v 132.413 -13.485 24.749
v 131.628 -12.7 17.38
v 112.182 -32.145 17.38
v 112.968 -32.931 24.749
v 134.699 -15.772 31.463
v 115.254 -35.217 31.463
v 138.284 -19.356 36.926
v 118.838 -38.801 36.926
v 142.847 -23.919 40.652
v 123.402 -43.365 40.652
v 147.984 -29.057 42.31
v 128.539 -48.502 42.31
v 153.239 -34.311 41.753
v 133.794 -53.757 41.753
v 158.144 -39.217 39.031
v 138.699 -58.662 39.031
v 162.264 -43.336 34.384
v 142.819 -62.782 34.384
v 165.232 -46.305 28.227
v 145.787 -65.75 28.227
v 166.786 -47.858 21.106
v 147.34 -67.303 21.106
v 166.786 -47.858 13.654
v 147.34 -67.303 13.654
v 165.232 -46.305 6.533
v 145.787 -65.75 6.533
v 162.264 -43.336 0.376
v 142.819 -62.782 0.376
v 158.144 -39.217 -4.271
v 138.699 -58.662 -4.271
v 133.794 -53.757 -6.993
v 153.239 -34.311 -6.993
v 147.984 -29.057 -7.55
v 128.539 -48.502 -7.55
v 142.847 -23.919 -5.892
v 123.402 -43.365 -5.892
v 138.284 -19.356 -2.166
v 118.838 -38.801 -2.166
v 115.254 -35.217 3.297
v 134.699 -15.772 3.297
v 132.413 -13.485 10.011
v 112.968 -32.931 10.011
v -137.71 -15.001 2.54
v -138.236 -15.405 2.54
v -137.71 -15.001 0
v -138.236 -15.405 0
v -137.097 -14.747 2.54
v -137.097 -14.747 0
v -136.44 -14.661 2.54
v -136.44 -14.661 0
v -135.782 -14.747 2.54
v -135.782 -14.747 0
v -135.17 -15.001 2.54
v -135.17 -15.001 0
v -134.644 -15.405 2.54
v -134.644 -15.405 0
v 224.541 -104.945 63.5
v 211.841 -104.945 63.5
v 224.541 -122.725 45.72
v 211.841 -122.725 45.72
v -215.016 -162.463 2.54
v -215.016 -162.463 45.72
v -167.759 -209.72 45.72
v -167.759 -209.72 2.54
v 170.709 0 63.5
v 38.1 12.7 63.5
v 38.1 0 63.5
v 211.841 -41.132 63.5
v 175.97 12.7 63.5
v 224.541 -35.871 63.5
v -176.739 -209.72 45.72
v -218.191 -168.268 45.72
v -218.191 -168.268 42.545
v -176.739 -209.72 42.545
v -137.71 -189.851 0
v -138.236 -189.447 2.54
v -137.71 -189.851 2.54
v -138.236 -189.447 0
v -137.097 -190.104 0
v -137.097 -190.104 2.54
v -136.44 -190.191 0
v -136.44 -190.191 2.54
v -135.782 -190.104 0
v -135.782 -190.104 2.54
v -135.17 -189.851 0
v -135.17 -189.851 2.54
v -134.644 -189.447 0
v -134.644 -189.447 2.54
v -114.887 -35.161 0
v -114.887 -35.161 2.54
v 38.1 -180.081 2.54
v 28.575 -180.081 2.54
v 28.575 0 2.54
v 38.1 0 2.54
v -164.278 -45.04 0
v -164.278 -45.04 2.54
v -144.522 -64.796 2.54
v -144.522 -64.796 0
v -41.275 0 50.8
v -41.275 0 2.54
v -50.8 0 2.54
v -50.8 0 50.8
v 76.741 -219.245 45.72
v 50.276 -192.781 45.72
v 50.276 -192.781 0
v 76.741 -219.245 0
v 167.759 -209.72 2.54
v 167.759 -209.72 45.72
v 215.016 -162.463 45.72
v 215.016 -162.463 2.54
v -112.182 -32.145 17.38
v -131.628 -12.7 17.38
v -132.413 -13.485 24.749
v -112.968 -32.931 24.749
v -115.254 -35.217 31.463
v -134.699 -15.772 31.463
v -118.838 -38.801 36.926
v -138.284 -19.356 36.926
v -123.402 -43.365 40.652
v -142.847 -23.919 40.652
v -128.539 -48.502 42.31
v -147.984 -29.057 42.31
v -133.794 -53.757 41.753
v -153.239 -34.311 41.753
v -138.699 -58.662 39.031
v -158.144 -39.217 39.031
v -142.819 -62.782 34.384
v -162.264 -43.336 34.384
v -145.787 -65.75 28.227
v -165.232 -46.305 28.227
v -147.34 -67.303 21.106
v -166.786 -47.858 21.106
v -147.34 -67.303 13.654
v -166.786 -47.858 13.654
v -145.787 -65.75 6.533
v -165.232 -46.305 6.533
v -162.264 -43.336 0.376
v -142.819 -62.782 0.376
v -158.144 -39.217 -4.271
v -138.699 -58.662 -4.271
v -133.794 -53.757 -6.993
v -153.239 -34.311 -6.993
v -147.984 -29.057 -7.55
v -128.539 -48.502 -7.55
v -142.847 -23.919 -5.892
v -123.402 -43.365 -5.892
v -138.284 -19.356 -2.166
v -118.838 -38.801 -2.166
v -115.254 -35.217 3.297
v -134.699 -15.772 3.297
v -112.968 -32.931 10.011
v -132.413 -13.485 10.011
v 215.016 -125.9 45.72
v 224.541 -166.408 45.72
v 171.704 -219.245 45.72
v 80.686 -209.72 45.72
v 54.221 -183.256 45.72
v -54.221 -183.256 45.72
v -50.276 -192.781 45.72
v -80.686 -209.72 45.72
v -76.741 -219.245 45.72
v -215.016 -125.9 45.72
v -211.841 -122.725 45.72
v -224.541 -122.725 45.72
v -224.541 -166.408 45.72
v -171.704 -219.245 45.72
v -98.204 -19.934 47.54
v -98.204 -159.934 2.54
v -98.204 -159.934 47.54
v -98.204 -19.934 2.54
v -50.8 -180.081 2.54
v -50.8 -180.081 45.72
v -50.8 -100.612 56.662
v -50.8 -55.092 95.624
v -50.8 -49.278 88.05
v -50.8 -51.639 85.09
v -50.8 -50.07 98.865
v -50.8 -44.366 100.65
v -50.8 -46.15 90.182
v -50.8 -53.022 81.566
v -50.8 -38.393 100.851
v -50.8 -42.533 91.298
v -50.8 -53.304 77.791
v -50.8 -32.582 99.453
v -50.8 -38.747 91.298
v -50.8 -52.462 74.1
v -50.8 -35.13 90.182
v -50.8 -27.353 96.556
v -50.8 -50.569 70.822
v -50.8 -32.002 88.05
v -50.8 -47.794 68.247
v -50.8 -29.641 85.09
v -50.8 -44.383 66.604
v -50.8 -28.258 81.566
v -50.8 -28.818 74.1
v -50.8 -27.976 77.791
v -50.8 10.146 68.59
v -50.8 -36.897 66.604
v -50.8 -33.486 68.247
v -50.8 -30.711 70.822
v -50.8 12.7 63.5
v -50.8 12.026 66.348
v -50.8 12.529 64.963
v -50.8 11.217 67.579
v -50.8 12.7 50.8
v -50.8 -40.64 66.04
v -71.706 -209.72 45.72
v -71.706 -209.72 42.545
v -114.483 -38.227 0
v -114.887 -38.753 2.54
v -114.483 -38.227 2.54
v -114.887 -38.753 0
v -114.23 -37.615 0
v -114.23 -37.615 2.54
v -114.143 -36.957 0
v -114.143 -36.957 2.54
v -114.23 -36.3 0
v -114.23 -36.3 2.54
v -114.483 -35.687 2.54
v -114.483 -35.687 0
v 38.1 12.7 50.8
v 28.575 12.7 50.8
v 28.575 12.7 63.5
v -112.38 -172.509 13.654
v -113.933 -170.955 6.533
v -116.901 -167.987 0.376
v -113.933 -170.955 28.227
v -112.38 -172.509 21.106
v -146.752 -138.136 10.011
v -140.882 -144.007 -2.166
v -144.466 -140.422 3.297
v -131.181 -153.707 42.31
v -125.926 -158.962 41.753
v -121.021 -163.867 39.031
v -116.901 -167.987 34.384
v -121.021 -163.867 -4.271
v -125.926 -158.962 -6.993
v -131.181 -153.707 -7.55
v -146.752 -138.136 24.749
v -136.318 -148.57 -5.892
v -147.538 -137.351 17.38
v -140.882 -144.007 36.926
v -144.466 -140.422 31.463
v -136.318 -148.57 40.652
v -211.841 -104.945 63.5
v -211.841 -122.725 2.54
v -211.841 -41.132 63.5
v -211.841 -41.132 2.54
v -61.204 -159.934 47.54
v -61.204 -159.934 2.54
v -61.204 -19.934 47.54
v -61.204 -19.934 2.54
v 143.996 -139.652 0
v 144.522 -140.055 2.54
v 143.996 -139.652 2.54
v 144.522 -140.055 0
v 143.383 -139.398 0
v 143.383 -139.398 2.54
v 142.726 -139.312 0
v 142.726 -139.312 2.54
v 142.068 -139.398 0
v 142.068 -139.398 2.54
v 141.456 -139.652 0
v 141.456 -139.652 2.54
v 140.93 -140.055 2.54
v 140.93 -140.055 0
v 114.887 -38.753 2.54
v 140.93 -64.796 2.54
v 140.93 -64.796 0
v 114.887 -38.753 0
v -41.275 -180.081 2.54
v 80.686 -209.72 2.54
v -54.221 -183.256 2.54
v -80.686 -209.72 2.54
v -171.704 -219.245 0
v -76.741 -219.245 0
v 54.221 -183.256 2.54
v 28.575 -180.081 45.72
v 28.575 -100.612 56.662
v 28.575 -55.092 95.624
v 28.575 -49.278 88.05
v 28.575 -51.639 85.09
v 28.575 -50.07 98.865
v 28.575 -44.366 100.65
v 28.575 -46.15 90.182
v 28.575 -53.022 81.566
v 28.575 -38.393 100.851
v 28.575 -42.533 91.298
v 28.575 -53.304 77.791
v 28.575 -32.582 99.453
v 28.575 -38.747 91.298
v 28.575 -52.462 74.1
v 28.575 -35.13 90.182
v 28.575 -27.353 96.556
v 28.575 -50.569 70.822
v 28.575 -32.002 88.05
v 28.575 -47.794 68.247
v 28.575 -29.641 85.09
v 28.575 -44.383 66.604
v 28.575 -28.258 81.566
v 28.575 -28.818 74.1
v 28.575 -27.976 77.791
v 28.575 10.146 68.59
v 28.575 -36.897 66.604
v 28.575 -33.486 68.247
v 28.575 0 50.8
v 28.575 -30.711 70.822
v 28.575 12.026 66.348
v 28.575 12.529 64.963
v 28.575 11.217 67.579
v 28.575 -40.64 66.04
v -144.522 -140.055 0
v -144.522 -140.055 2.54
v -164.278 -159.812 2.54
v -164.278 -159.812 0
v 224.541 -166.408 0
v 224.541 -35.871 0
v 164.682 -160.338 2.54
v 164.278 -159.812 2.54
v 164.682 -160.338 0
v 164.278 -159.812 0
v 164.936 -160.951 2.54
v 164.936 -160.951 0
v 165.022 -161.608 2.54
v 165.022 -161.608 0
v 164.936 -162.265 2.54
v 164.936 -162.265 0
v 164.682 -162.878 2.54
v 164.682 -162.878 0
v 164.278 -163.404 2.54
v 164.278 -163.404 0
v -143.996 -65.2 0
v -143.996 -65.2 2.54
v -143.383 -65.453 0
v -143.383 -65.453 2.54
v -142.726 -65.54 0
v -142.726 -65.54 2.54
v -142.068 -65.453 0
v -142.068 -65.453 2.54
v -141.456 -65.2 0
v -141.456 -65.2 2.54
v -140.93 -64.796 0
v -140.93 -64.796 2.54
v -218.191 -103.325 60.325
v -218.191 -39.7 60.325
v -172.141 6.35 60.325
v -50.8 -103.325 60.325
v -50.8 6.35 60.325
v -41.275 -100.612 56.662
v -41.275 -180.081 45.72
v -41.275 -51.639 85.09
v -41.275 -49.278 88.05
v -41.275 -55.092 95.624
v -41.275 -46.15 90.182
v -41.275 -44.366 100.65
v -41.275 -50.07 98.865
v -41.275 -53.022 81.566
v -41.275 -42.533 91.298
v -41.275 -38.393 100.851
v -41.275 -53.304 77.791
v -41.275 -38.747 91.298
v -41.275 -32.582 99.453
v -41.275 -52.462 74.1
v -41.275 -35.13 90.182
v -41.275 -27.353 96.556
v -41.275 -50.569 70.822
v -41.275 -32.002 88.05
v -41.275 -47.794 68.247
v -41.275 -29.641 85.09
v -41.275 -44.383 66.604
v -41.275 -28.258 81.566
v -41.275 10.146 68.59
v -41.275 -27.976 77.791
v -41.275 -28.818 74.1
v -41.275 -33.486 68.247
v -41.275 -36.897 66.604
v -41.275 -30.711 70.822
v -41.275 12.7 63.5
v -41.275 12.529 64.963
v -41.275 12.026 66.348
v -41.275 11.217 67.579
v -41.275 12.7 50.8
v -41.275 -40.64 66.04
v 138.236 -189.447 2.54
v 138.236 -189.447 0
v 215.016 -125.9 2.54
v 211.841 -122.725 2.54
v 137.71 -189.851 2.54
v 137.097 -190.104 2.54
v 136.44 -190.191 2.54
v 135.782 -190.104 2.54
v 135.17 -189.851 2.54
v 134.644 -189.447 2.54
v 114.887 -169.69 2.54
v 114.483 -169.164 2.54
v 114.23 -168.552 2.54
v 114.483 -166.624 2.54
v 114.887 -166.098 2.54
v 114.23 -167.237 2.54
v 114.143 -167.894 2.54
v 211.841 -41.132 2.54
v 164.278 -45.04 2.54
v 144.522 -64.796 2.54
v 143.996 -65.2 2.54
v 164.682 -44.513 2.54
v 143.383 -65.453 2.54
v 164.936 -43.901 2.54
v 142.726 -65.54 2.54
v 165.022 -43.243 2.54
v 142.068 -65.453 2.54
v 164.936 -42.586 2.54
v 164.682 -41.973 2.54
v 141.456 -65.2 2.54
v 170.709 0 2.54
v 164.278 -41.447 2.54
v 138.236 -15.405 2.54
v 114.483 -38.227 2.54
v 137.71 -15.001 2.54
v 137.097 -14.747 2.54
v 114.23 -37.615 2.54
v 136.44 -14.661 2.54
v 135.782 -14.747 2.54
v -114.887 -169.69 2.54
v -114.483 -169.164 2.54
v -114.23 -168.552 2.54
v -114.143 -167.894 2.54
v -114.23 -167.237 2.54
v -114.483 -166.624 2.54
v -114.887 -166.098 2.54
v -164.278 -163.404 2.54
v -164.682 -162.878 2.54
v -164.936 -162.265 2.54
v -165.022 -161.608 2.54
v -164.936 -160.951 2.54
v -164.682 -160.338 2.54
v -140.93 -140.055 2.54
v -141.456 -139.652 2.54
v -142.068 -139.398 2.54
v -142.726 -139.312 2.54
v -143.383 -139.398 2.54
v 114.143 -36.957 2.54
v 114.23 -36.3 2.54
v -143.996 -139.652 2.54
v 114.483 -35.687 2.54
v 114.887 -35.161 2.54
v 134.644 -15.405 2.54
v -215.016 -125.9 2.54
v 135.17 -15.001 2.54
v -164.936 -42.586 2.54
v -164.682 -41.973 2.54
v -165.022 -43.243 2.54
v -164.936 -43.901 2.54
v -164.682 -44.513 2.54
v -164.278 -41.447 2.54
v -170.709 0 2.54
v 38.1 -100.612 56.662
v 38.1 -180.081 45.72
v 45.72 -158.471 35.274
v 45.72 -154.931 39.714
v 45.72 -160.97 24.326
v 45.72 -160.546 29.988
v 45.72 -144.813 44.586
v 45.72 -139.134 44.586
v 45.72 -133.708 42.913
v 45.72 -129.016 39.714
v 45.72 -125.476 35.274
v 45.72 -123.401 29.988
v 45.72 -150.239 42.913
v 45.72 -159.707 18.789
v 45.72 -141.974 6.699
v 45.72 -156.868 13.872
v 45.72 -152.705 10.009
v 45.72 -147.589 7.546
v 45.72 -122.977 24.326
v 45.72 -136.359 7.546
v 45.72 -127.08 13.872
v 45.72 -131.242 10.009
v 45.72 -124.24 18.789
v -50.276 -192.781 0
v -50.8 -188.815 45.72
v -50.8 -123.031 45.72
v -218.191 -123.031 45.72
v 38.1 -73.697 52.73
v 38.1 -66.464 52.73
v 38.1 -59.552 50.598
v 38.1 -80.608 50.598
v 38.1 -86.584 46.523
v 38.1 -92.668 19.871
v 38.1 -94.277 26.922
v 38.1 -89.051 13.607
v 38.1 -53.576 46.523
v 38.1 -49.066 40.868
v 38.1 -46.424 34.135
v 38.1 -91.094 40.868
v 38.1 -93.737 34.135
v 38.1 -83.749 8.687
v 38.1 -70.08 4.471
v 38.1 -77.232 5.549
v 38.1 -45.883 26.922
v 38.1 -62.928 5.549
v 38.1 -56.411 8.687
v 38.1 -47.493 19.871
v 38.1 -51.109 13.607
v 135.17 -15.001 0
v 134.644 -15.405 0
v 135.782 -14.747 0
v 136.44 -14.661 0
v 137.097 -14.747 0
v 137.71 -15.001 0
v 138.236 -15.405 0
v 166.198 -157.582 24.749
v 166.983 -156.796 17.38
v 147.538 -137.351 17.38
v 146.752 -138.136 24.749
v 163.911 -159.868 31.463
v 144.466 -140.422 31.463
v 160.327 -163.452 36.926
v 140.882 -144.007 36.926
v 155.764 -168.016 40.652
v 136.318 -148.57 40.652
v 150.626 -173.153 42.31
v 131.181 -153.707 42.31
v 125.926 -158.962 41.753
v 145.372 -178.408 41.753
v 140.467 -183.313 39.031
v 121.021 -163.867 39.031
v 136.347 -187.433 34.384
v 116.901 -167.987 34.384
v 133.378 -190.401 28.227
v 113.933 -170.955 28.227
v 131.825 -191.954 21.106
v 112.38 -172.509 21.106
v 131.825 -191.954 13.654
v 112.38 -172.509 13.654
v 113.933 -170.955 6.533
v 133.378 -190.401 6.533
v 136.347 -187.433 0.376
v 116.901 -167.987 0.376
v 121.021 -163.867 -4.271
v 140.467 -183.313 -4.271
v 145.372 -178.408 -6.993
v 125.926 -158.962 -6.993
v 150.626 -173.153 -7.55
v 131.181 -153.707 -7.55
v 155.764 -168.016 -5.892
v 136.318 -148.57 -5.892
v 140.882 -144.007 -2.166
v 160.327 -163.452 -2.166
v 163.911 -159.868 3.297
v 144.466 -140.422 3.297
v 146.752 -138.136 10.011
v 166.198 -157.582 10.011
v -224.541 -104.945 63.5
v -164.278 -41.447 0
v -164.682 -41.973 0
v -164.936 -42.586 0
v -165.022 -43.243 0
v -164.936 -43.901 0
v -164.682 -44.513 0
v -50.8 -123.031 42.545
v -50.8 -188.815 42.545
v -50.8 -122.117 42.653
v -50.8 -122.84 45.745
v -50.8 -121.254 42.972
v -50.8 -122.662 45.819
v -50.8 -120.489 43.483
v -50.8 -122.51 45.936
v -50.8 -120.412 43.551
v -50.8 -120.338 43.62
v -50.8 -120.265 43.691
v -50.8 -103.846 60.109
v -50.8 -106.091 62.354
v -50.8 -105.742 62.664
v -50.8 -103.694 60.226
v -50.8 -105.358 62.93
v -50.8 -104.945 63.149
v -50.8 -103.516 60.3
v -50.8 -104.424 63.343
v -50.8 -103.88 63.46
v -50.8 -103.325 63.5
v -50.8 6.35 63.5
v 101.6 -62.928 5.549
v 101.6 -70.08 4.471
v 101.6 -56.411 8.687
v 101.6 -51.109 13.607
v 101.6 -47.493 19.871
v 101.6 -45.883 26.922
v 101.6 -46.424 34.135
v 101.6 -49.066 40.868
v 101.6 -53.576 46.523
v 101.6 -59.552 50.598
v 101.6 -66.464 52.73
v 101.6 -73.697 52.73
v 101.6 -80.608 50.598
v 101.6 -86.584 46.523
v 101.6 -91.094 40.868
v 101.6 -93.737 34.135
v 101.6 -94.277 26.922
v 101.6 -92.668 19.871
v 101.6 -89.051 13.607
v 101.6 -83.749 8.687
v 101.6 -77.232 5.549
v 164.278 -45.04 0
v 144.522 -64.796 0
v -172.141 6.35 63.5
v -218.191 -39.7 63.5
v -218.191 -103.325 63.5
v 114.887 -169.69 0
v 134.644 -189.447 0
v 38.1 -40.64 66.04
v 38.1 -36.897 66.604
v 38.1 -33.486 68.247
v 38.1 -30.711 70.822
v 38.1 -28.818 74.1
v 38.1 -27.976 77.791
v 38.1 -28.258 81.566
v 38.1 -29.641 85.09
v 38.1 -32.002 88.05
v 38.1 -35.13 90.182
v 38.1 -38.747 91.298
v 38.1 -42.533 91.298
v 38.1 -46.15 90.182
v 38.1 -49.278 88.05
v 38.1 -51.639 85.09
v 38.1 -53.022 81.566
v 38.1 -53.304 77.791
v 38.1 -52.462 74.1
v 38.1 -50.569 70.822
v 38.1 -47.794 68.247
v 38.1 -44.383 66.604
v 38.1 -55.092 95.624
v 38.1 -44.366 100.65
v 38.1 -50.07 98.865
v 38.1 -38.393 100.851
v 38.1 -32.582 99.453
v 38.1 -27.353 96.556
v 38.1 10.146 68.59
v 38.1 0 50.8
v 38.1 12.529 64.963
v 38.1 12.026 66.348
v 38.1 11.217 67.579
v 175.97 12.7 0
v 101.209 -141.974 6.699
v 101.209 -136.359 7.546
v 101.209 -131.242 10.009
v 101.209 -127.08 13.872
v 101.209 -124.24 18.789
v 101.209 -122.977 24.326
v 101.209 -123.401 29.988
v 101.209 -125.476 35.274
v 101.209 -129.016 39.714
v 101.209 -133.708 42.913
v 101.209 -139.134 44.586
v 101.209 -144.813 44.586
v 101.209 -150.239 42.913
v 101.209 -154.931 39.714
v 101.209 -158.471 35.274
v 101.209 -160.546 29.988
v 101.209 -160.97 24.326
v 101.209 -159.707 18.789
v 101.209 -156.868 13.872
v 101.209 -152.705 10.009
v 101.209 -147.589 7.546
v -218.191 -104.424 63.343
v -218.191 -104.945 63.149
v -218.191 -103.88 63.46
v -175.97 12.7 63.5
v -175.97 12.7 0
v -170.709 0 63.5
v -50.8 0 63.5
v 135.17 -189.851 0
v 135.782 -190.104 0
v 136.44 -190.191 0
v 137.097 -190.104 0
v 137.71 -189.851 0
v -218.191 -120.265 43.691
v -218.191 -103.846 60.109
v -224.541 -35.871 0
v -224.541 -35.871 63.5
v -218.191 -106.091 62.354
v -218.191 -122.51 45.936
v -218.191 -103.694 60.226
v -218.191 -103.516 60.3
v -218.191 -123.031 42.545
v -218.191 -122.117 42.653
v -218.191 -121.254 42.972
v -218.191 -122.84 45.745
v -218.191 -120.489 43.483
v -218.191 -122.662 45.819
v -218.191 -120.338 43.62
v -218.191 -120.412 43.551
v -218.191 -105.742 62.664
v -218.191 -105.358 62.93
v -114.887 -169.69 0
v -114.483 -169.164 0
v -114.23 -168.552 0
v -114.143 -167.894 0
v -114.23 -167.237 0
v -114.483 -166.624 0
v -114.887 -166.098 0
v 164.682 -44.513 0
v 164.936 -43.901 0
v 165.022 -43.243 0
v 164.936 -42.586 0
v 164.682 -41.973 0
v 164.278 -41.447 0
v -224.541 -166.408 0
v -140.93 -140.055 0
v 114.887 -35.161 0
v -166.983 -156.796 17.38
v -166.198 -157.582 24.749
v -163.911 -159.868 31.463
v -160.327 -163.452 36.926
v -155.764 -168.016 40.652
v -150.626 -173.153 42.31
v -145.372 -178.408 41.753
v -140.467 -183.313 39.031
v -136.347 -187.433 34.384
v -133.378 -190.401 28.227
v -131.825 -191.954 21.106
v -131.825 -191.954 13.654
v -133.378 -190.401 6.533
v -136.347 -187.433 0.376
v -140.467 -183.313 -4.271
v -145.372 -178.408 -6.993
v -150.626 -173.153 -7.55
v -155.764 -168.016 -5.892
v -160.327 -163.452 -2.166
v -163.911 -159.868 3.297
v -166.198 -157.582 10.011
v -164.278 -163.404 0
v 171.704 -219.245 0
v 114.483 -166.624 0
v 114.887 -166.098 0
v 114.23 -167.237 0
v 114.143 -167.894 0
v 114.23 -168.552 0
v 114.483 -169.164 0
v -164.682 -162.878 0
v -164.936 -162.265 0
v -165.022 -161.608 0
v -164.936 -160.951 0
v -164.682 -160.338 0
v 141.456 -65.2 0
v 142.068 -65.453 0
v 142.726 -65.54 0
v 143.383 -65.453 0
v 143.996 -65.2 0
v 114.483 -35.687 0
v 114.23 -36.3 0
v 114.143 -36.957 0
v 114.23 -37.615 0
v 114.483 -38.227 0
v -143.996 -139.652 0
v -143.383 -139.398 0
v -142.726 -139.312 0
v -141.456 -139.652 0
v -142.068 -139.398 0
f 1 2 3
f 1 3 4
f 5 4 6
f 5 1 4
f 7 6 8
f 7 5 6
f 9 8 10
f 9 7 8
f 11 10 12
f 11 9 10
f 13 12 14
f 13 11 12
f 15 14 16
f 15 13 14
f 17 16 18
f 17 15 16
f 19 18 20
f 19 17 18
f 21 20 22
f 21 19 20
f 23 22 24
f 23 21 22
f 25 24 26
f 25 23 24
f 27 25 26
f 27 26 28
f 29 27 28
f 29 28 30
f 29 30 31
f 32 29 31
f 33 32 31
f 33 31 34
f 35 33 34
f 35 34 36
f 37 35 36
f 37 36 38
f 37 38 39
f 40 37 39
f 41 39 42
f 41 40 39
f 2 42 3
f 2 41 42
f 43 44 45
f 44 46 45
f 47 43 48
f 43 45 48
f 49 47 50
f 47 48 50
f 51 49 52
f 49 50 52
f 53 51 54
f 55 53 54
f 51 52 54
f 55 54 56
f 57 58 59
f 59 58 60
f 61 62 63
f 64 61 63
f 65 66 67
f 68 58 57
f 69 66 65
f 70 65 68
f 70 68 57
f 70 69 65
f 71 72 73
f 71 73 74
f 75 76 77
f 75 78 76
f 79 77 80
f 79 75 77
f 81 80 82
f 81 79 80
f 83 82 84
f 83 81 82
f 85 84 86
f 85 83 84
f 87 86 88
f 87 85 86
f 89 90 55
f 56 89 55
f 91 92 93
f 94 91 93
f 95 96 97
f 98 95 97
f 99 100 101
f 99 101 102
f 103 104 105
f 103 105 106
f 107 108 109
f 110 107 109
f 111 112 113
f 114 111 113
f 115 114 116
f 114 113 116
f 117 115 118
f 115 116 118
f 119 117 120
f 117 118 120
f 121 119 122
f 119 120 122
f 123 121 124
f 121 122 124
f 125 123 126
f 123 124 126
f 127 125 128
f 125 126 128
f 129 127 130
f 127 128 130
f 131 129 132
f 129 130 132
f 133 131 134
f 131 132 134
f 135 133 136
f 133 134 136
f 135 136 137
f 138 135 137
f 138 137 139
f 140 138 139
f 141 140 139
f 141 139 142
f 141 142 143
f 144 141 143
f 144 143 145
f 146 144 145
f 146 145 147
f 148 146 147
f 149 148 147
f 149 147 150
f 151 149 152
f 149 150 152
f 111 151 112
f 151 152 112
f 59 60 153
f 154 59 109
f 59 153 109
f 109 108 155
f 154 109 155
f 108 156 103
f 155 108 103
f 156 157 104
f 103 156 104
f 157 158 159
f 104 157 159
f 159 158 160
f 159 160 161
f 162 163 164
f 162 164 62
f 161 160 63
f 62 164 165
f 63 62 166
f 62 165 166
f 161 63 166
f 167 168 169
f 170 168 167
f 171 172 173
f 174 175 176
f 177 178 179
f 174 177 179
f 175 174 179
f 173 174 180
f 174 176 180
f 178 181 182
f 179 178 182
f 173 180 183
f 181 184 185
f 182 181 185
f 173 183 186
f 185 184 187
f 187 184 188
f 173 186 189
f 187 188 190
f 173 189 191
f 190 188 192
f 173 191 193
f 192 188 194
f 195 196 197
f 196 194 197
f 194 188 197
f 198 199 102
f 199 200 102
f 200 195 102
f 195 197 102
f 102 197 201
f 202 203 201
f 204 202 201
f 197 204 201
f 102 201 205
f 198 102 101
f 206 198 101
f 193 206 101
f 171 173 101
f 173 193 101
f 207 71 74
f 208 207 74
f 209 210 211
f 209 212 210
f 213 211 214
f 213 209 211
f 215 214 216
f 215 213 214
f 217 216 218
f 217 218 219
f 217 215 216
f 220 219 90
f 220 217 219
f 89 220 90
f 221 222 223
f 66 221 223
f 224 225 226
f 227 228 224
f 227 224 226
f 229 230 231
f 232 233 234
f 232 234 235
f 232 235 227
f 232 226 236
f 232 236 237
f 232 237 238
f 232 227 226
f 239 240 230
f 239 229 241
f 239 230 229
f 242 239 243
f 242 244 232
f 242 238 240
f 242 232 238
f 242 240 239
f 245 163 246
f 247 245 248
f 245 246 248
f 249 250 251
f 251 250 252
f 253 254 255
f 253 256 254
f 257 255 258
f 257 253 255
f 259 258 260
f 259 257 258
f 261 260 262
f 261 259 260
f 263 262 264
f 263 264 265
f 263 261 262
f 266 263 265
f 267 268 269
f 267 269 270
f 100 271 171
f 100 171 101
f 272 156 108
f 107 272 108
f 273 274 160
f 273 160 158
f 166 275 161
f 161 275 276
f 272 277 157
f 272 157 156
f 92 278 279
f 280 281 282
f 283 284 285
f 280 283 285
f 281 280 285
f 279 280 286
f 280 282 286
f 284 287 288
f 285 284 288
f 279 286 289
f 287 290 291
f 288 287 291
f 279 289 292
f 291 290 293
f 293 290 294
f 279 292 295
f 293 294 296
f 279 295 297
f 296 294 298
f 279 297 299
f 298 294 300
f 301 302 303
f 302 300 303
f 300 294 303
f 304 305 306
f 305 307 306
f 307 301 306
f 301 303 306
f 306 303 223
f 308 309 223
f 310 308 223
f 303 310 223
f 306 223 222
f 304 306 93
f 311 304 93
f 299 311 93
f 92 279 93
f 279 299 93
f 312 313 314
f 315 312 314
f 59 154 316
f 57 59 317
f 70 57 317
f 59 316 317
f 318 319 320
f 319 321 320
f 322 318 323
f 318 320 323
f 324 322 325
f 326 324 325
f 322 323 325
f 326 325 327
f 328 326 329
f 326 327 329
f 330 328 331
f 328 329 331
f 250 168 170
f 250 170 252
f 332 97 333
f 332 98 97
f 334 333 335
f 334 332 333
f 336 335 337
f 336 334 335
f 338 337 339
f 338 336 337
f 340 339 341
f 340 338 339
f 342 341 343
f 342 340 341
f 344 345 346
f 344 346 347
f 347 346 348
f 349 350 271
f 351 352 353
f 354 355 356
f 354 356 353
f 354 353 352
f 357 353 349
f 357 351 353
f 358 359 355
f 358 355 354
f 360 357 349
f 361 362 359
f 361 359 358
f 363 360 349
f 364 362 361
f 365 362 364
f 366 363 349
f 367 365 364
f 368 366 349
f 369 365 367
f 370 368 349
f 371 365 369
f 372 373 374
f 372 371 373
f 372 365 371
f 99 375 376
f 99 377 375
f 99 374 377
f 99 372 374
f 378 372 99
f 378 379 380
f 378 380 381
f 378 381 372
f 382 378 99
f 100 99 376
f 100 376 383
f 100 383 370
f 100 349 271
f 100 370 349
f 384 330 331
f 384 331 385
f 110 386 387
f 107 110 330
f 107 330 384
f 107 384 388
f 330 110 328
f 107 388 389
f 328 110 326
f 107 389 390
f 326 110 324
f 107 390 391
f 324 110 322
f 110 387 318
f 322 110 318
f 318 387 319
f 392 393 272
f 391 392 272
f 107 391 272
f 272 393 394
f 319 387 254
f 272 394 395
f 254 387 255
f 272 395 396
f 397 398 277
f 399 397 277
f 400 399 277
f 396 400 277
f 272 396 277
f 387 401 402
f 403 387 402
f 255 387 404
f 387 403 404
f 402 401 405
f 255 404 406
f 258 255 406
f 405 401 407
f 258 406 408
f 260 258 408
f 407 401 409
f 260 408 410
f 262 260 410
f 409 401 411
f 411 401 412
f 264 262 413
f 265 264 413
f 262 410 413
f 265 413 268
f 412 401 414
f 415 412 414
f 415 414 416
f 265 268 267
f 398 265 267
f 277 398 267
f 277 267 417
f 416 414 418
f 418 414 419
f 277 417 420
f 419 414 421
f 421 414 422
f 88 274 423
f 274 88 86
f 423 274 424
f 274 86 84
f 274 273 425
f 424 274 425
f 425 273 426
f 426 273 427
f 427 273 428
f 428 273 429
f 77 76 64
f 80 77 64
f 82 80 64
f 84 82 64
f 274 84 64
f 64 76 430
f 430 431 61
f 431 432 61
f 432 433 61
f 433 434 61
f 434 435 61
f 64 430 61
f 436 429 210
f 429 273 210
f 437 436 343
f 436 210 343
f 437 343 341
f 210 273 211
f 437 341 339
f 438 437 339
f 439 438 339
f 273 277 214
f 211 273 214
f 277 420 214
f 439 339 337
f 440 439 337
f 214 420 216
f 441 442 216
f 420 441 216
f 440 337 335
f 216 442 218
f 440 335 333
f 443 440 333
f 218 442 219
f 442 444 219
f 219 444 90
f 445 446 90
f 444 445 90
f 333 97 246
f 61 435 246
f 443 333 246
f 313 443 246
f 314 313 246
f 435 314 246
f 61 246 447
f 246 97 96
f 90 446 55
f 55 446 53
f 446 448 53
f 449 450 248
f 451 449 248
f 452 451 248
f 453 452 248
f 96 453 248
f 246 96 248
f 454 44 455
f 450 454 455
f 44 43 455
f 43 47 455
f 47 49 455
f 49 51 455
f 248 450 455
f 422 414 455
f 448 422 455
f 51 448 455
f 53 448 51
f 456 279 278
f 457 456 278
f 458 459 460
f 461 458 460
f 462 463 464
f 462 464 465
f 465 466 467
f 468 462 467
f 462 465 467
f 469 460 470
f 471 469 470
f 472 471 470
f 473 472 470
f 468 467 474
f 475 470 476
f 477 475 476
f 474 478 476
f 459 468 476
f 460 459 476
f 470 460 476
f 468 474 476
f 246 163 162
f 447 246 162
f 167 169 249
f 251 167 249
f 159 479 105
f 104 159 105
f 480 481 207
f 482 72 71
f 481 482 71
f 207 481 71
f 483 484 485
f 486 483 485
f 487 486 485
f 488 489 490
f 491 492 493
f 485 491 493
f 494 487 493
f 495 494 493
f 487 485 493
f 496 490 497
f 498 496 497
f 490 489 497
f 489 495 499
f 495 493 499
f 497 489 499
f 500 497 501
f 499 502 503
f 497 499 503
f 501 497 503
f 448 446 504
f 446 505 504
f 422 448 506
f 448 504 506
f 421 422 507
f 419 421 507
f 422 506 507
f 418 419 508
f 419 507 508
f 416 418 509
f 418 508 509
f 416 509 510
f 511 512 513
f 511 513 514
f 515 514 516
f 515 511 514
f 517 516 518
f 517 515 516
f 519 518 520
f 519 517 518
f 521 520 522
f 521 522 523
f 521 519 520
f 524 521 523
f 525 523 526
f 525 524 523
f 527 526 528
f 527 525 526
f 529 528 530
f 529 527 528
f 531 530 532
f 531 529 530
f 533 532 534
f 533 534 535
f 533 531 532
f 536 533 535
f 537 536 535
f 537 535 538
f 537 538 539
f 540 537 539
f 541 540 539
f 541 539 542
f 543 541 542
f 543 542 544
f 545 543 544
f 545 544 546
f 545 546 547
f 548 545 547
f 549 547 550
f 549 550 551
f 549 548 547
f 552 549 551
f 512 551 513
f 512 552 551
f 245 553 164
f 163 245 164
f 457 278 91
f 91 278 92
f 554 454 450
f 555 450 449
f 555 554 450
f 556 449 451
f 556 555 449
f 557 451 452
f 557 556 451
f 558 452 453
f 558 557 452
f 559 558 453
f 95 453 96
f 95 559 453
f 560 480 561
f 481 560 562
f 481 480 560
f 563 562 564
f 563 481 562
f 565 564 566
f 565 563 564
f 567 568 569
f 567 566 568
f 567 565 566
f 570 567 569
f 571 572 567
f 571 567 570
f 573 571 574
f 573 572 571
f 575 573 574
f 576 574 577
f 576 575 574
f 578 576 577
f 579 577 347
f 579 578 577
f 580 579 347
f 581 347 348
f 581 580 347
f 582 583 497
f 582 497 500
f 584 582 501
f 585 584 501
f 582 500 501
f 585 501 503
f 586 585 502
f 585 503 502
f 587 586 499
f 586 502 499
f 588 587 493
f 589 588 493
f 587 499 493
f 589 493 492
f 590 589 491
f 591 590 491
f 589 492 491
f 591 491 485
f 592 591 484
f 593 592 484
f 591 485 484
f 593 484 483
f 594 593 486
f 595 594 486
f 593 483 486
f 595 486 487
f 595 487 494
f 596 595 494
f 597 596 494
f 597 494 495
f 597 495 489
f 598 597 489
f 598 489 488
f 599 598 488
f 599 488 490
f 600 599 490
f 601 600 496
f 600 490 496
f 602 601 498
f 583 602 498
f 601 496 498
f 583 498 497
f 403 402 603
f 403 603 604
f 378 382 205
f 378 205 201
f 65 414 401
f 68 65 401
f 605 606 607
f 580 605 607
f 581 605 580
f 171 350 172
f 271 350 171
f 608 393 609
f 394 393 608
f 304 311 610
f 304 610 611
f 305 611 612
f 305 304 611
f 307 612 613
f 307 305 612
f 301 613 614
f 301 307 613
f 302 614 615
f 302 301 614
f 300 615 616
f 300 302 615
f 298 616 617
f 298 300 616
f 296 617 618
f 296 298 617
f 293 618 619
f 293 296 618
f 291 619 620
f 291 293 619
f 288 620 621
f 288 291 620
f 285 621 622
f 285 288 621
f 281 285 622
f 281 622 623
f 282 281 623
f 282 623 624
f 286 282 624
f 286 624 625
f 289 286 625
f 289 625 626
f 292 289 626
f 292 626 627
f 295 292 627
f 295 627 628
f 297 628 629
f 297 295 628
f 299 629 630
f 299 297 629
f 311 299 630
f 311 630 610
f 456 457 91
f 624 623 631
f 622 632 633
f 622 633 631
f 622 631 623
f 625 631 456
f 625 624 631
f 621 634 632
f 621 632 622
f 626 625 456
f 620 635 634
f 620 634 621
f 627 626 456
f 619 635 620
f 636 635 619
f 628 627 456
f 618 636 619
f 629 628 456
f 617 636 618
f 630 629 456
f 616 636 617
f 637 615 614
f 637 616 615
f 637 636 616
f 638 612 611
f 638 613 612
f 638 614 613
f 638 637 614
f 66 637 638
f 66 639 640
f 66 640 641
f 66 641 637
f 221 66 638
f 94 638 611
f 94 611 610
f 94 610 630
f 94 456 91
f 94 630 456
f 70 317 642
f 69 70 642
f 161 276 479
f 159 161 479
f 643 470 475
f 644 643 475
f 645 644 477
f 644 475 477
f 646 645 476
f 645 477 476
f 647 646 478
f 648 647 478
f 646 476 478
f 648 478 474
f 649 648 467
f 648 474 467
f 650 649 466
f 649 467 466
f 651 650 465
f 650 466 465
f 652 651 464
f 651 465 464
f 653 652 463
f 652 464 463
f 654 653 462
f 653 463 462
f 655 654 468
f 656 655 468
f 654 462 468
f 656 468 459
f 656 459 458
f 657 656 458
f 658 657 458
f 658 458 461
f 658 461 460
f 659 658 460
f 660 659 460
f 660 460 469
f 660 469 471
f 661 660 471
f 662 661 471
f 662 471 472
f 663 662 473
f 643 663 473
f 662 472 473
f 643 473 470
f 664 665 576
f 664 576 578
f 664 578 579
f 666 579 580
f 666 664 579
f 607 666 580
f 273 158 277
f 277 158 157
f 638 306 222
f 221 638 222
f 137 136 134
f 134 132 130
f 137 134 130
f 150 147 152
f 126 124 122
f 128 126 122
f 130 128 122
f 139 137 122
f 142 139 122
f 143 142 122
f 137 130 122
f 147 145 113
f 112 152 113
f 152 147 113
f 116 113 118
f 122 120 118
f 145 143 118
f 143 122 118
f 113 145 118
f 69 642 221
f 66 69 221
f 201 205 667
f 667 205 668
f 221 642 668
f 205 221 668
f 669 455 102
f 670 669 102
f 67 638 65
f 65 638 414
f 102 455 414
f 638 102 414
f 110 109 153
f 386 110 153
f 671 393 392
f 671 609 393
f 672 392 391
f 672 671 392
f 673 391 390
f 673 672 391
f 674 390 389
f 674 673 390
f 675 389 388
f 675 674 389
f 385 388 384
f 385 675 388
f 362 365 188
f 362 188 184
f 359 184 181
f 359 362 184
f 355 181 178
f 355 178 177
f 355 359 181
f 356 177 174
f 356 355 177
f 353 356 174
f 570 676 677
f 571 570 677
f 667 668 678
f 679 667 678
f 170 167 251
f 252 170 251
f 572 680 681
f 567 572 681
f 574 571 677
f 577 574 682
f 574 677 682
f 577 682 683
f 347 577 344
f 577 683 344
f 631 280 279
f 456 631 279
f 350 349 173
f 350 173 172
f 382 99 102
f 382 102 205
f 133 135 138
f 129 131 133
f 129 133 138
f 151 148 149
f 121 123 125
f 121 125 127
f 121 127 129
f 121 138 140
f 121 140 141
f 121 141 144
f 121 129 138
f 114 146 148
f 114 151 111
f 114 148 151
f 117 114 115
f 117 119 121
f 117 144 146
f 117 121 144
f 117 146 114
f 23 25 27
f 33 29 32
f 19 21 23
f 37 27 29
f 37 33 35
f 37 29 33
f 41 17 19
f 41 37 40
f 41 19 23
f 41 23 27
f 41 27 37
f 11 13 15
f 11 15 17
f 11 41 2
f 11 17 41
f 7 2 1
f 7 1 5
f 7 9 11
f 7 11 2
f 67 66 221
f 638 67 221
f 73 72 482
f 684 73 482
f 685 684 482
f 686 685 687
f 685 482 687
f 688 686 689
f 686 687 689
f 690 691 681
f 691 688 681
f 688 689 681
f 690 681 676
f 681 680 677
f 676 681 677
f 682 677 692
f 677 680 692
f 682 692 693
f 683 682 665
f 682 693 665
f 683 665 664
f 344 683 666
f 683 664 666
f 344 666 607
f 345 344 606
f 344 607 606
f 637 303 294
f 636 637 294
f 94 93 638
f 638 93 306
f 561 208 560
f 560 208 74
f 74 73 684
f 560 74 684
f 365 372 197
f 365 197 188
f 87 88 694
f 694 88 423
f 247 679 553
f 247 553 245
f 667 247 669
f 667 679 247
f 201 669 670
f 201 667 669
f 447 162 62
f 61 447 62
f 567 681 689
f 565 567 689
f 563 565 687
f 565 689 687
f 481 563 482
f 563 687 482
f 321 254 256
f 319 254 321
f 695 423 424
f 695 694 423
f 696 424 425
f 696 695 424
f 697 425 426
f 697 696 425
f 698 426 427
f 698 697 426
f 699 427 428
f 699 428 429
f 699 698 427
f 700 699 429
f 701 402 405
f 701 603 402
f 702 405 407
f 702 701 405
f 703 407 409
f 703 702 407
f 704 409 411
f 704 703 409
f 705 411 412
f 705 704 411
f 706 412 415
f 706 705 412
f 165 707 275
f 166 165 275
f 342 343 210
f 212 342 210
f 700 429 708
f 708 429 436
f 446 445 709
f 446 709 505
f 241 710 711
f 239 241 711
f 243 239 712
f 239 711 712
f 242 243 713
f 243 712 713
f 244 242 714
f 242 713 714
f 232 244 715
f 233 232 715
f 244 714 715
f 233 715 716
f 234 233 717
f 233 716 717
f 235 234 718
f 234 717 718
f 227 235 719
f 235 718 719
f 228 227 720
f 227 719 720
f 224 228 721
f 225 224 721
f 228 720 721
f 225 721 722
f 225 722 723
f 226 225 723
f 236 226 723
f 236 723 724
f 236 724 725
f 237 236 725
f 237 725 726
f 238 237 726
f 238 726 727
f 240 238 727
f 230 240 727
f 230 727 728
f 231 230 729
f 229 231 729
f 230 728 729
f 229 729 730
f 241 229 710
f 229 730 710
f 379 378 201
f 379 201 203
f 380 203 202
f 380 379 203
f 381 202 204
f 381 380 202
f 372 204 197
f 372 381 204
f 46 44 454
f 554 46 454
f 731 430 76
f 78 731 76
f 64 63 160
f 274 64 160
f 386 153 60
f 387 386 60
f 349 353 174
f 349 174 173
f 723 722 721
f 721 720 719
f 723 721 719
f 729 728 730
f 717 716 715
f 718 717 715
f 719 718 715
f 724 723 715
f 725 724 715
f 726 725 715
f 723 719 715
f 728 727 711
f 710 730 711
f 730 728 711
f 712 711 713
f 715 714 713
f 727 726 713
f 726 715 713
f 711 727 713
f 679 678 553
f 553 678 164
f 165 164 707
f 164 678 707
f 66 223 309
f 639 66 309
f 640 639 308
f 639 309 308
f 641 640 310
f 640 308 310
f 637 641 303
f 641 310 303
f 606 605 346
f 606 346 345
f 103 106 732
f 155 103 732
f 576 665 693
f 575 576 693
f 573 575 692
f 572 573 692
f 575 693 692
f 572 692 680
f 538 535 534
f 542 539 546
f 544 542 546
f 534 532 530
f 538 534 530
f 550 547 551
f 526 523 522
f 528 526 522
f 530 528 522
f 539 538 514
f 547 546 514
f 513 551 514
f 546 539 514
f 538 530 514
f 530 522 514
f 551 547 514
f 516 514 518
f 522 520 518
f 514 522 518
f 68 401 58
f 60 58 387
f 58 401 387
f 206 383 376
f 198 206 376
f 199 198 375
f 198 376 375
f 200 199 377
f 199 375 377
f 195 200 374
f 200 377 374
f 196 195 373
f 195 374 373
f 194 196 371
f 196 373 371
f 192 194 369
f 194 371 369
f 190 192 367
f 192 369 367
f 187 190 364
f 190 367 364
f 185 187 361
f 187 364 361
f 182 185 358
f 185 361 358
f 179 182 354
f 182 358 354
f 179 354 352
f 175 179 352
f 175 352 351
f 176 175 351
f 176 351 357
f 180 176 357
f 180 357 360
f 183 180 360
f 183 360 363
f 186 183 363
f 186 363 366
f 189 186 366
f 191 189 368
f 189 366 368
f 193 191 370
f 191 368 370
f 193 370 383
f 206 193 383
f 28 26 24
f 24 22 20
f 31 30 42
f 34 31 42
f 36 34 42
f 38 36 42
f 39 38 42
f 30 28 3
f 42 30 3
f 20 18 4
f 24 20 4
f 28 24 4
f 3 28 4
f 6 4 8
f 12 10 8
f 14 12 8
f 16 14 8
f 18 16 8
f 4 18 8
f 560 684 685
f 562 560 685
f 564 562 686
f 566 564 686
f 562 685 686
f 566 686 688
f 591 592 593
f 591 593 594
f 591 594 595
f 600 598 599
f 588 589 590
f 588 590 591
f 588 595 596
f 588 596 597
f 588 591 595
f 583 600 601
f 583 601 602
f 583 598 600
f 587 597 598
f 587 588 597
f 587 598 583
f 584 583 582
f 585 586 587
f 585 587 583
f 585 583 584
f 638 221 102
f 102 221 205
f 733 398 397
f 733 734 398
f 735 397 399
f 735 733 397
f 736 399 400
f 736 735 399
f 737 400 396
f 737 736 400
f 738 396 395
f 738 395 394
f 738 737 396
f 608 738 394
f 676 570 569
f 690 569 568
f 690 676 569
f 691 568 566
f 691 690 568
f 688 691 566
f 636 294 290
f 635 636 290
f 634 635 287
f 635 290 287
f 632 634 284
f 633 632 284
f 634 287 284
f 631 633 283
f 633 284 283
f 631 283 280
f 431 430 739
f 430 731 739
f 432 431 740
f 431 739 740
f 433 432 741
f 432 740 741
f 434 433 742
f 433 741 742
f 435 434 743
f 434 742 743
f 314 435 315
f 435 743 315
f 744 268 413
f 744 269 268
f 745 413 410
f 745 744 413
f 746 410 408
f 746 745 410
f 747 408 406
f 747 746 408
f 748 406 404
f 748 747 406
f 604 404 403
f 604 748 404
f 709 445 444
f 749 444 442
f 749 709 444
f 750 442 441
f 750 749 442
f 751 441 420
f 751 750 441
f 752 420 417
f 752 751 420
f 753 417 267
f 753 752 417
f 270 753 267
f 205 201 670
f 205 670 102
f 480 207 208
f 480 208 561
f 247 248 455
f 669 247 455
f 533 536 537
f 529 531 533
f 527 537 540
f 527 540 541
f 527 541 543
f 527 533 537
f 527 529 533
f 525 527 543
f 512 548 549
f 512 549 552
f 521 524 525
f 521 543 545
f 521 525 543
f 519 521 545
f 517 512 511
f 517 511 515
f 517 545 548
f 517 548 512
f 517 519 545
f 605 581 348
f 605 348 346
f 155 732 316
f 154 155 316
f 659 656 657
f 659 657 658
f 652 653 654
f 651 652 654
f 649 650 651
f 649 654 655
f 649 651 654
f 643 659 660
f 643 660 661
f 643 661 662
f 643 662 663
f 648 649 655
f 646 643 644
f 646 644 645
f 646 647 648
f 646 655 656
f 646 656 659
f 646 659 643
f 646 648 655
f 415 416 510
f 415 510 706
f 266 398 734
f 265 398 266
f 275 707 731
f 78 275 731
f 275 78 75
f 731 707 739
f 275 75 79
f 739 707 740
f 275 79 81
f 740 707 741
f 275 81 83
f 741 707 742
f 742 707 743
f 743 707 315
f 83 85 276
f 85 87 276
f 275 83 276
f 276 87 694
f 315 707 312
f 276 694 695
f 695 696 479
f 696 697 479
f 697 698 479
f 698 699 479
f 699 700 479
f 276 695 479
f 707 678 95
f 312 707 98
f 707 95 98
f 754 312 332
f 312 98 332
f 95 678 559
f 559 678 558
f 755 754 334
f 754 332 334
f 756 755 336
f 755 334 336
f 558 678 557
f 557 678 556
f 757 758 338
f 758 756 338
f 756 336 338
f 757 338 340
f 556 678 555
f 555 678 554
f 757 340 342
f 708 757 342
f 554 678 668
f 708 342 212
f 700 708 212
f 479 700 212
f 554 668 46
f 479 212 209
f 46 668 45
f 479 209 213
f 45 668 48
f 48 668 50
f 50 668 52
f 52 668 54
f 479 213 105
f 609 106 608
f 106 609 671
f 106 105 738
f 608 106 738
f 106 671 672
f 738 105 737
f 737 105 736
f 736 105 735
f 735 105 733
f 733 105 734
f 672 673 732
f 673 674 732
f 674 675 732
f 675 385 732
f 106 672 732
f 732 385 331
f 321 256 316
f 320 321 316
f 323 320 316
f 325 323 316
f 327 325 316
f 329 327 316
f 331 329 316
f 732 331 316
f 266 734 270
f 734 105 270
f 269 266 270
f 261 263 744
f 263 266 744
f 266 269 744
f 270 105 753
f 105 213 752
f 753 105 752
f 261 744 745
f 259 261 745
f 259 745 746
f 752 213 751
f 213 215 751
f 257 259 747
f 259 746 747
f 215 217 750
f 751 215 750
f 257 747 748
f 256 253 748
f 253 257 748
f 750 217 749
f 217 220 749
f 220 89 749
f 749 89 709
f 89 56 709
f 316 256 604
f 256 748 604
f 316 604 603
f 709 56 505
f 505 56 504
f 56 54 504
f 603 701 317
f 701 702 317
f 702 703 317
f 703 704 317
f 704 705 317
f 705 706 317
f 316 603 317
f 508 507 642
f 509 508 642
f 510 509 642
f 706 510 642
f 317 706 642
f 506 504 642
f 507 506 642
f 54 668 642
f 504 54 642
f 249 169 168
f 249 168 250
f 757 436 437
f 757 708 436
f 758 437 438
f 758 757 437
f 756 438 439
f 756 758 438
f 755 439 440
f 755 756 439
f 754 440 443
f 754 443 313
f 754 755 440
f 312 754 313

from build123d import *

# Parameters (mm, degrees)
TEMP_START              = 2.54
TEMP_BATTERY_OUTLINE_W  = 37
TEMP_BATTERY_OUTLINE_H  = 140
TEMP_BATTERY_DEPTH      = 45
TEMP_START_2            = 45.72
SIDEVIEW_SKETCH_R       = 19.05
TEMP_ARM_MOTOR_DEPTH    = 55.488642
TEMP_START_3            = 38.1
SKETCH9_3_R             = 24.264839711
TEMP_DISK_MOTOR_DEPTH   = 63.5
SKETCH2_R               = 25
TEMP_FRONT_WHEEL_DEPTH  = 27.5
SKETCH3_R               = 25
TEMP_BACK_WHEEL_DEPTH   = 27.5
BOSS_EXTRUDE14_DEPTH    = 63.5
CUT_EXTRUDE1_DEPTH      = 504.761656475
SKETCH13_W              = 88.9
SKETCH13_H              = 12.7
CUT_EXTRUDE2_DEPTH      = 12.7
CUT_EXTRUDE4_DEPTH      = 319.327625669
BILLET_BOTTOM_DEPTH     = 2.54
CUT_EXTRUDE3_DEPTH      = 321.186776216
CUT_EXTRUDE3_DEPTH_BACK = 321.186776216
L_START                 = -41.275
SKETCH8_R               = 12.7
L_UPRIGHT_DEPTH         = 9.525
R_START                 = 28.575
SKETCH8_5_R             = 12.7
R_UPRIGHT_DEPTH         = 9.525
FILLET1_R               = 2.54
BASE_FLANGE2_DEPTH      = 3.175
EDGE_FLANGE3_START      = -218.191187662
EDGE_FLANGE3_DEPTH      = 167.391187662
EDGE_FLANGE3_2_DEPTH    = 167.391187662
EDGE_FLANGE4_START      = -218.191187662
EDGE_FLANGE4_DEPTH      = 167.391187662
EDGE_FLANGE4_2_DEPTH    = 167.391187662
CUT_EXTRUDE5_DEPTH      = 319.652368089


# Read off the part's stored shape, not the designer's step: Temp Battery, Edge-Flange3, Edge-Flange4
# Sheet-metal steps are written as plain solids
with BuildPart() as part:
    # Temp Battery outline → Temp Battery (new body)
    with BuildSketch(Plane.XY.offset(TEMP_START)):
        with Locations((-79.704052147, -89.933835326)):
            Rectangle(TEMP_BATTERY_OUTLINE_W, TEMP_BATTERY_OUTLINE_H)
    extrude(amount=TEMP_BATTERY_DEPTH)


with BuildPart() as body_2:
    # Sideview Sketch → Temp Arm Motor (new body)
    with BuildSketch(Plane(origin=(0, 0, 0), x_dir=(0, 0, -1), z_dir=(1, 0, 0)).offset(TEMP_START_2)):
        with Locations((-25.749228435, -141.973618126)):
            Circle(SIDEVIEW_SKETCH_R)
    extrude(amount=TEMP_ARM_MOTOR_DEPTH)


with BuildPart() as body_3:
    # Sketch9<3> → Temp Disk Motor (new body)
    with BuildSketch(Plane(origin=(0, 0, 0), x_dir=(0, 0, -1), z_dir=(1, 0, 0)).offset(TEMP_START_3)):
        with Locations((-28.735809635, -70.080189422)):
            Circle(SKETCH9_3_R)
    extrude(amount=TEMP_DISK_MOTOR_DEPTH)


with BuildPart() as body_4:
    # Sketch2 → Temp Front Wheel (new body)
    with BuildSketch(Plane(origin=(-59.46385062, 59.46385062, 0), x_dir=(0, 0, 1), z_dir=(0.707106781186475, -0.7071067811866201, 0))):
        with Locations(Location((17.38, 127.05509626, 0), (0, 0, 270))):
            Circle(SKETCH2_R)
    extrude(amount=TEMP_FRONT_WHEEL_DEPTH)


with BuildPart() as body_5:
    # Sketch3 → Temp Back Wheel (new body)
    with BuildSketch(Plane(origin=(-161.889626162, -161.889626162, 0), x_dir=(0, 0, -1), z_dir=(0.7071067811866171, 0.7071067811864781, 0))):
        with Locations(Location((-17.38, -17.796824648, 0), (0, 0, 90))):
            Circle(SKETCH3_R)
    extrude(amount=TEMP_BACK_WHEEL_DEPTH)


with BuildPart() as body_6:
    # Mirror3: mirrored copy
    add(body_4.part.mirror(Plane(origin=(0, 0, 0), x_dir=(0, 0, 1), z_dir=(1, 0, 0))))


with BuildPart() as body_7:
    # Mirror3 2: mirrored copy
    add(body_5.part.mirror(Plane(origin=(0, 0, 0), x_dir=(0, 0, 1), z_dir=(1, 0, 0))))


with BuildPart() as body_8:
    # Sketch11 → Boss-Extrude14 (new body)
    with BuildSketch(Plane.XY):
        Polygon((-224.541187662, -166.408288725), (-171.704005038, -219.245471349), (-76.740625367, -219.245471349), (-50.275950129, -192.780796112), (50.275950129, -192.780796112), (76.740625367, -219.245471349), (171.704005038, -219.245471349), (224.541187662, -166.408288725), (224.541187662, -35.871479098), (175.969708564, 12.7), (-175.969708564, 12.7), (-224.541187662, -35.871479098), align=None)
        Polygon((-170.709196322, 0), (170.709196322, 0), (211.841187662, -41.13199134), (211.841187662, -161.147776483), (166.443492796, -206.545471349), (82.001137609, -206.545471349), (55.536462372, -180.080796112), (-55.536462372, -180.080796112), (-82.001137609, -206.545471349), (-166.443492796, -206.545471349), (-211.841187662, -161.147776483), (-211.841187662, -41.13199134), align=None, mode=Mode.SUBTRACT)
    extrude(amount=BOSS_EXTRUDE14_DEPTH)

    # Sketch12 → Cut-Extrude1 (cut, through all)
    with BuildSketch(Plane(origin=(-224.541187662, 0, 0), x_dir=(0, 0, -1), z_dir=(1, 0, 0))):
        Polygon((-63.5, -104.945471349), (-45.72, -122.725471349), (-45.72, -219.245471349), (-63.5, -219.245471349), align=None)
    extrude(amount=CUT_EXTRUDE1_DEPTH, mode=Mode.SUBTRACT)

    # Sketch13 → Cut-Extrude2 (cut)
    with BuildSketch(Plane(origin=(0, 12.7, 0), x_dir=(-1, 0, 0), z_dir=(0, -1, 0))):
        with Locations((6.35, -57.15)):
            Rectangle(SKETCH13_W, SKETCH13_H)
    extrude(amount=CUT_EXTRUDE2_DEPTH, mode=Mode.SUBTRACT)

    # Sketch31 → Cut-Extrude4 (cut, through all)
    with BuildSketch(Plane.XY.offset(45.72)):
        Polygon((-211.841187662, -122.725471349), (-215.016187662, -125.900471349), (-215.016187662, -162.462904543), (-167.758620856, -209.720471349), (-80.686009548, -209.720471349), (-54.221334311, -183.255796112), (0, -183.255796112), (54.221334311, -183.255796112), (80.686009548, -209.720471349), (167.758620856, -209.720471349), (215.016187662, -162.462904543), (215.016187662, -125.900471349), (211.841187662, -122.725471349), (211.841187662, -161.147776483), (166.443492796, -206.545471349), (82.001137609, -206.545471349), (55.536462372, -180.080796112), (0, -180.080796112), (-55.536462372, -180.080796112), (-82.001137609, -206.545471349), (-166.443492796, -206.545471349), (-211.841187662, -161.147776483), align=None)
    extrude(amount=-CUT_EXTRUDE4_DEPTH, mode=Mode.SUBTRACT)

    # Sketch14 → Billet Bottom (add)
    with BuildSketch(Plane(origin=(0, 0, 0), x_dir=(-1, 0, 0), z_dir=(0, 0, -1))):
        Polygon((224.541187662, -166.408288725), (224.541187662, -35.871479098), (175.969708564, 12.7), (-175.969708564, 12.7), (-224.541187662, -35.871479098), (-224.541187662, -166.408288725), (-171.704005038, -219.245471349), (-76.740625367, -219.245471349), (-50.275950129, -192.780796112), (50.275950129, -192.780796112), (76.740625367, -219.245471349), (171.704005038, -219.245471349), align=None)
    extrude(amount=-BILLET_BOTTOM_DEPTH)

    # Sketch15 → Cut-Extrude3 (cut, two sides: drawn at the far end of the back side and taken through both)
    with BuildSketch(Plane(origin=(0, 0, 0), x_dir=(-1, 0, 0), z_dir=(0, 0, -1)).offset(-CUT_EXTRUDE3_DEPTH_BACK)):
        Polygon((-136.439562886, -13.608632214), (-166.074408085, -43.243477413), (-142.72574217, -66.592143328), (-113.090896971, -36.957298129), align=None)
        Polygon((-166.074408085, -161.608073671), (-136.439562886, -191.24291887), (-113.090896971, -167.894252955), (-142.72574217, -138.259407756), align=None)
        Polygon((136.439562886, -13.608632214), (166.074408085, -43.243477413), (142.72574217, -66.592143328), (113.090896971, -36.957298129), align=None)
        Polygon((166.074408085, -161.608073671), (136.439562886, -191.24291887), (113.090896971, -167.894252955), (142.72574217, -138.259407756), align=None)
    extrude(amount=CUT_EXTRUDE3_DEPTH + CUT_EXTRUDE3_DEPTH_BACK, mode=Mode.SUBTRACT)

    # Fillet1
    fillet1_edges = [body_8.edges().sort_by_distance(p)[0] for p in [
        (113.090896971, -167.894252955, 1.27),
        (136.439562886, -191.24291887, 1.27),
        (166.074408085, -161.608073671, 1.27),
        (142.72574217, -138.259407756, 1.27),
        (-166.074408085, -43.243477413, 1.27),
        (-142.72574217, -66.592143328, 1.27),
        (-113.090896971, -36.957298129, 1.27),
        (-136.439562886, -13.608632214, 1.27),
        (-136.439562886, -191.24291887, 1.27),
        (-113.090896971, -167.894252955, 1.27),
        (-142.72574217, -138.259407756, 1.27),
        (-166.074408085, -161.608073671, 1.27),
        (142.72574217, -66.592143328, 1.27),
        (166.074408085, -43.243477413, 1.27),
        (136.439562886, -13.608632214, 1.27),
        (113.090896971, -36.957298129, 1.27),
    ]]
    fillet(fillet1_edges, radius=FILLET1_R)


with BuildPart() as body_9:
    # Sketch8 → L Upright (new body)
    with BuildSketch(Plane(origin=(0, 0, 0), x_dir=(0, 0, -1), z_dir=(1, 0, 0)).offset(L_START)):
        with BuildLine():
            Line((-50.8, 0), (-50.8, 12.7))
            Line((-50.8, 12.7), (-63.5, 12.7))
            ThreePointArc((-63.5, 12.7), (-66.347516998, 12.025750783), (-68.59032971, 10.146188014))
            Line((-68.59032971, 10.146188014), (-96.556153987, -27.35334195))
            ThreePointArc((-96.556153987, -27.35334195), (-100.952472396, -41.38612001), (-95.624400091, -55.092254445))
            Line((-95.624400091, -55.092254445), (-56.662044199, -100.611519823))
            Line((-56.662044199, -100.611519823), (-45.72, -180.080796112))
            Line((-45.72, -180.080796112), (-2.54, -180.080796112))
            Line((-2.54, -180.080796112), (-2.54, 0))
            Line((-2.54, 0), (-50.8, 0))
        make_face()
        with Locations((-78.74, -40.64)):
            Circle(SKETCH8_R, mode=Mode.SUBTRACT)
    extrude(amount=-L_UPRIGHT_DEPTH)


with BuildPart() as body_10:
    # Sketch8<5> → R Upright (new body)
    with BuildSketch(Plane(origin=(0, 0, 0), x_dir=(0, 0, -1), z_dir=(1, 0, 0)).offset(R_START)):
        with BuildLine():
            Line((-50.8, 0), (-50.8, 12.7))
            Line((-50.8, 12.7), (-63.5, 12.7))
            ThreePointArc((-63.5, 12.7), (-66.347516998, 12.025750783), (-68.59032971, 10.146188014))
            Line((-68.59032971, 10.146188014), (-96.556153987, -27.35334195))
            ThreePointArc((-96.556153987, -27.35334195), (-100.952472396, -41.38612001), (-95.624400091, -55.092254445))
            Line((-95.624400091, -55.092254445), (-56.662044199, -100.611519823))
            Line((-56.662044199, -100.611519823), (-45.72, -180.080796112))
            Line((-45.72, -180.080796112), (-2.54, -180.080796112))
            Line((-2.54, -180.080796112), (-2.54, 0))
            Line((-2.54, 0), (-50.8, 0))
        make_face()
        with Locations((-78.74, -40.64)):
            Circle(SKETCH8_5_R, mode=Mode.SUBTRACT)
    extrude(amount=R_UPRIGHT_DEPTH)


with BuildPart() as body_11:
    # Sketch17 → Base-Flange2 (new body)
    with BuildSketch(Plane.XY.offset(63.5)):
        Polygon((-218.191187662, -104.945471349), (-50.8, -104.945471349), (-50.8, 6.35), (-172.141337216, 6.35), (-218.191187662, -39.699850446), align=None)
    extrude(amount=-BASE_FLANGE2_DEPTH)

    # Edge-Flange3 outline → Edge-Flange3 (cut)
    with BuildSketch(Plane.YZ.offset(EDGE_FLANGE3_START)):
        with BuildLine():
            Line((-104.945471349, 63.5), (-104.945471349, 63.148658997))
            ThreePointArc((-104.945471349, 63.148658997), (-104.15418034, 63.411155789), (-103.325233579, 63.5))
            Line((-103.325233579, 63.5), (-104.945471349, 63.5))
        make_face()
    extrude(amount=EDGE_FLANGE3_DEPTH, mode=Mode.SUBTRACT)

    # Edge-Flange3 2 outline → Edge-Flange3 2 (add)
    with BuildSketch(Plane.YZ.offset(EDGE_FLANGE3_START)):
        with BuildLine():
            ThreePointArc((-104.945471349, 63.148658997), (-105.553985832, 62.80294164), (-106.091152464, 62.354318885))
            Line((-106.091152464, 62.354318885), (-122.725471349, 45.72))
            Line((-122.725471349, 45.72), (-120.480407319, 43.47493597))
            Line((-120.480407319, 43.47493597), (-103.846088434, 60.109254855))
            ThreePointArc((-103.846088434, 60.109254855), (-103.607118195, 60.268929664), (-103.325233579, 60.325))
            Line((-103.325233579, 60.325), (-104.945471349, 60.325))
            Line((-104.945471349, 60.325), (-104.945471349, 63.148658997))
        make_face()
    extrude(amount=EDGE_FLANGE3_2_DEPTH)

    # Edge-Flange4 outline → Edge-Flange4 (cut)
    with BuildSketch(Plane.YZ.offset(EDGE_FLANGE4_START)):
        with BuildLine():
            ThreePointArc((-120.264662174, 43.690681115), (-120.374724567, 43.584833845), (-120.488834353, 43.483363004))
            Line((-120.488834353, 43.483363004), (-120.480407319, 43.47493597))
            Line((-120.480407319, 43.47493597), (-120.264662174, 43.690681115))
        make_face()
    extrude(amount=EDGE_FLANGE4_DEPTH, mode=Mode.SUBTRACT)

    # Edge-Flange4 2 outline → Edge-Flange4 2 (add)
    with BuildSketch(Plane.YZ.offset(EDGE_FLANGE4_START)):
        with BuildLine():
            Line((-209.720471349, 42.545), (-123.030581059, 42.545))
            ThreePointArc((-123.030581059, 42.545), (-121.675866934, 42.787081749), (-120.488834353, 43.483363004))
            Line((-120.488834353, 43.483363004), (-122.725471349, 45.72))
            Line((-122.725471349, 45.72), (-122.509726204, 45.935745145))
            ThreePointArc((-122.509726204, 45.935745145), (-122.748696443, 45.776070336), (-123.030581059, 45.72))
            Line((-123.030581059, 45.72), (-209.720471349, 45.72))
            Line((-209.720471349, 45.72), (-209.720471349, 42.545))
        make_face()
    extrude(amount=EDGE_FLANGE4_2_DEPTH)

    # Sketch45 → Cut-Extrude5 (cut, through all)
    with BuildSketch(Plane.XY.offset(45.72)):
        Polygon((-71.705753427, -209.720471349), (-50.8, -188.814717922), (-50.8, -209.720471349), align=None)
        Polygon((-218.191187662, -168.268160664), (-176.738876977, -209.720471349), (-218.191187662, -209.720471349), align=None)
    extrude(amount=-CUT_EXTRUDE5_DEPTH, mode=Mode.SUBTRACT)


solid = Compound([part.part, body_2.part, body_3.part, body_4.part, body_5.part, body_6.part, body_7.part, body_8.part, body_9.part, body_10.part, body_11.part])
